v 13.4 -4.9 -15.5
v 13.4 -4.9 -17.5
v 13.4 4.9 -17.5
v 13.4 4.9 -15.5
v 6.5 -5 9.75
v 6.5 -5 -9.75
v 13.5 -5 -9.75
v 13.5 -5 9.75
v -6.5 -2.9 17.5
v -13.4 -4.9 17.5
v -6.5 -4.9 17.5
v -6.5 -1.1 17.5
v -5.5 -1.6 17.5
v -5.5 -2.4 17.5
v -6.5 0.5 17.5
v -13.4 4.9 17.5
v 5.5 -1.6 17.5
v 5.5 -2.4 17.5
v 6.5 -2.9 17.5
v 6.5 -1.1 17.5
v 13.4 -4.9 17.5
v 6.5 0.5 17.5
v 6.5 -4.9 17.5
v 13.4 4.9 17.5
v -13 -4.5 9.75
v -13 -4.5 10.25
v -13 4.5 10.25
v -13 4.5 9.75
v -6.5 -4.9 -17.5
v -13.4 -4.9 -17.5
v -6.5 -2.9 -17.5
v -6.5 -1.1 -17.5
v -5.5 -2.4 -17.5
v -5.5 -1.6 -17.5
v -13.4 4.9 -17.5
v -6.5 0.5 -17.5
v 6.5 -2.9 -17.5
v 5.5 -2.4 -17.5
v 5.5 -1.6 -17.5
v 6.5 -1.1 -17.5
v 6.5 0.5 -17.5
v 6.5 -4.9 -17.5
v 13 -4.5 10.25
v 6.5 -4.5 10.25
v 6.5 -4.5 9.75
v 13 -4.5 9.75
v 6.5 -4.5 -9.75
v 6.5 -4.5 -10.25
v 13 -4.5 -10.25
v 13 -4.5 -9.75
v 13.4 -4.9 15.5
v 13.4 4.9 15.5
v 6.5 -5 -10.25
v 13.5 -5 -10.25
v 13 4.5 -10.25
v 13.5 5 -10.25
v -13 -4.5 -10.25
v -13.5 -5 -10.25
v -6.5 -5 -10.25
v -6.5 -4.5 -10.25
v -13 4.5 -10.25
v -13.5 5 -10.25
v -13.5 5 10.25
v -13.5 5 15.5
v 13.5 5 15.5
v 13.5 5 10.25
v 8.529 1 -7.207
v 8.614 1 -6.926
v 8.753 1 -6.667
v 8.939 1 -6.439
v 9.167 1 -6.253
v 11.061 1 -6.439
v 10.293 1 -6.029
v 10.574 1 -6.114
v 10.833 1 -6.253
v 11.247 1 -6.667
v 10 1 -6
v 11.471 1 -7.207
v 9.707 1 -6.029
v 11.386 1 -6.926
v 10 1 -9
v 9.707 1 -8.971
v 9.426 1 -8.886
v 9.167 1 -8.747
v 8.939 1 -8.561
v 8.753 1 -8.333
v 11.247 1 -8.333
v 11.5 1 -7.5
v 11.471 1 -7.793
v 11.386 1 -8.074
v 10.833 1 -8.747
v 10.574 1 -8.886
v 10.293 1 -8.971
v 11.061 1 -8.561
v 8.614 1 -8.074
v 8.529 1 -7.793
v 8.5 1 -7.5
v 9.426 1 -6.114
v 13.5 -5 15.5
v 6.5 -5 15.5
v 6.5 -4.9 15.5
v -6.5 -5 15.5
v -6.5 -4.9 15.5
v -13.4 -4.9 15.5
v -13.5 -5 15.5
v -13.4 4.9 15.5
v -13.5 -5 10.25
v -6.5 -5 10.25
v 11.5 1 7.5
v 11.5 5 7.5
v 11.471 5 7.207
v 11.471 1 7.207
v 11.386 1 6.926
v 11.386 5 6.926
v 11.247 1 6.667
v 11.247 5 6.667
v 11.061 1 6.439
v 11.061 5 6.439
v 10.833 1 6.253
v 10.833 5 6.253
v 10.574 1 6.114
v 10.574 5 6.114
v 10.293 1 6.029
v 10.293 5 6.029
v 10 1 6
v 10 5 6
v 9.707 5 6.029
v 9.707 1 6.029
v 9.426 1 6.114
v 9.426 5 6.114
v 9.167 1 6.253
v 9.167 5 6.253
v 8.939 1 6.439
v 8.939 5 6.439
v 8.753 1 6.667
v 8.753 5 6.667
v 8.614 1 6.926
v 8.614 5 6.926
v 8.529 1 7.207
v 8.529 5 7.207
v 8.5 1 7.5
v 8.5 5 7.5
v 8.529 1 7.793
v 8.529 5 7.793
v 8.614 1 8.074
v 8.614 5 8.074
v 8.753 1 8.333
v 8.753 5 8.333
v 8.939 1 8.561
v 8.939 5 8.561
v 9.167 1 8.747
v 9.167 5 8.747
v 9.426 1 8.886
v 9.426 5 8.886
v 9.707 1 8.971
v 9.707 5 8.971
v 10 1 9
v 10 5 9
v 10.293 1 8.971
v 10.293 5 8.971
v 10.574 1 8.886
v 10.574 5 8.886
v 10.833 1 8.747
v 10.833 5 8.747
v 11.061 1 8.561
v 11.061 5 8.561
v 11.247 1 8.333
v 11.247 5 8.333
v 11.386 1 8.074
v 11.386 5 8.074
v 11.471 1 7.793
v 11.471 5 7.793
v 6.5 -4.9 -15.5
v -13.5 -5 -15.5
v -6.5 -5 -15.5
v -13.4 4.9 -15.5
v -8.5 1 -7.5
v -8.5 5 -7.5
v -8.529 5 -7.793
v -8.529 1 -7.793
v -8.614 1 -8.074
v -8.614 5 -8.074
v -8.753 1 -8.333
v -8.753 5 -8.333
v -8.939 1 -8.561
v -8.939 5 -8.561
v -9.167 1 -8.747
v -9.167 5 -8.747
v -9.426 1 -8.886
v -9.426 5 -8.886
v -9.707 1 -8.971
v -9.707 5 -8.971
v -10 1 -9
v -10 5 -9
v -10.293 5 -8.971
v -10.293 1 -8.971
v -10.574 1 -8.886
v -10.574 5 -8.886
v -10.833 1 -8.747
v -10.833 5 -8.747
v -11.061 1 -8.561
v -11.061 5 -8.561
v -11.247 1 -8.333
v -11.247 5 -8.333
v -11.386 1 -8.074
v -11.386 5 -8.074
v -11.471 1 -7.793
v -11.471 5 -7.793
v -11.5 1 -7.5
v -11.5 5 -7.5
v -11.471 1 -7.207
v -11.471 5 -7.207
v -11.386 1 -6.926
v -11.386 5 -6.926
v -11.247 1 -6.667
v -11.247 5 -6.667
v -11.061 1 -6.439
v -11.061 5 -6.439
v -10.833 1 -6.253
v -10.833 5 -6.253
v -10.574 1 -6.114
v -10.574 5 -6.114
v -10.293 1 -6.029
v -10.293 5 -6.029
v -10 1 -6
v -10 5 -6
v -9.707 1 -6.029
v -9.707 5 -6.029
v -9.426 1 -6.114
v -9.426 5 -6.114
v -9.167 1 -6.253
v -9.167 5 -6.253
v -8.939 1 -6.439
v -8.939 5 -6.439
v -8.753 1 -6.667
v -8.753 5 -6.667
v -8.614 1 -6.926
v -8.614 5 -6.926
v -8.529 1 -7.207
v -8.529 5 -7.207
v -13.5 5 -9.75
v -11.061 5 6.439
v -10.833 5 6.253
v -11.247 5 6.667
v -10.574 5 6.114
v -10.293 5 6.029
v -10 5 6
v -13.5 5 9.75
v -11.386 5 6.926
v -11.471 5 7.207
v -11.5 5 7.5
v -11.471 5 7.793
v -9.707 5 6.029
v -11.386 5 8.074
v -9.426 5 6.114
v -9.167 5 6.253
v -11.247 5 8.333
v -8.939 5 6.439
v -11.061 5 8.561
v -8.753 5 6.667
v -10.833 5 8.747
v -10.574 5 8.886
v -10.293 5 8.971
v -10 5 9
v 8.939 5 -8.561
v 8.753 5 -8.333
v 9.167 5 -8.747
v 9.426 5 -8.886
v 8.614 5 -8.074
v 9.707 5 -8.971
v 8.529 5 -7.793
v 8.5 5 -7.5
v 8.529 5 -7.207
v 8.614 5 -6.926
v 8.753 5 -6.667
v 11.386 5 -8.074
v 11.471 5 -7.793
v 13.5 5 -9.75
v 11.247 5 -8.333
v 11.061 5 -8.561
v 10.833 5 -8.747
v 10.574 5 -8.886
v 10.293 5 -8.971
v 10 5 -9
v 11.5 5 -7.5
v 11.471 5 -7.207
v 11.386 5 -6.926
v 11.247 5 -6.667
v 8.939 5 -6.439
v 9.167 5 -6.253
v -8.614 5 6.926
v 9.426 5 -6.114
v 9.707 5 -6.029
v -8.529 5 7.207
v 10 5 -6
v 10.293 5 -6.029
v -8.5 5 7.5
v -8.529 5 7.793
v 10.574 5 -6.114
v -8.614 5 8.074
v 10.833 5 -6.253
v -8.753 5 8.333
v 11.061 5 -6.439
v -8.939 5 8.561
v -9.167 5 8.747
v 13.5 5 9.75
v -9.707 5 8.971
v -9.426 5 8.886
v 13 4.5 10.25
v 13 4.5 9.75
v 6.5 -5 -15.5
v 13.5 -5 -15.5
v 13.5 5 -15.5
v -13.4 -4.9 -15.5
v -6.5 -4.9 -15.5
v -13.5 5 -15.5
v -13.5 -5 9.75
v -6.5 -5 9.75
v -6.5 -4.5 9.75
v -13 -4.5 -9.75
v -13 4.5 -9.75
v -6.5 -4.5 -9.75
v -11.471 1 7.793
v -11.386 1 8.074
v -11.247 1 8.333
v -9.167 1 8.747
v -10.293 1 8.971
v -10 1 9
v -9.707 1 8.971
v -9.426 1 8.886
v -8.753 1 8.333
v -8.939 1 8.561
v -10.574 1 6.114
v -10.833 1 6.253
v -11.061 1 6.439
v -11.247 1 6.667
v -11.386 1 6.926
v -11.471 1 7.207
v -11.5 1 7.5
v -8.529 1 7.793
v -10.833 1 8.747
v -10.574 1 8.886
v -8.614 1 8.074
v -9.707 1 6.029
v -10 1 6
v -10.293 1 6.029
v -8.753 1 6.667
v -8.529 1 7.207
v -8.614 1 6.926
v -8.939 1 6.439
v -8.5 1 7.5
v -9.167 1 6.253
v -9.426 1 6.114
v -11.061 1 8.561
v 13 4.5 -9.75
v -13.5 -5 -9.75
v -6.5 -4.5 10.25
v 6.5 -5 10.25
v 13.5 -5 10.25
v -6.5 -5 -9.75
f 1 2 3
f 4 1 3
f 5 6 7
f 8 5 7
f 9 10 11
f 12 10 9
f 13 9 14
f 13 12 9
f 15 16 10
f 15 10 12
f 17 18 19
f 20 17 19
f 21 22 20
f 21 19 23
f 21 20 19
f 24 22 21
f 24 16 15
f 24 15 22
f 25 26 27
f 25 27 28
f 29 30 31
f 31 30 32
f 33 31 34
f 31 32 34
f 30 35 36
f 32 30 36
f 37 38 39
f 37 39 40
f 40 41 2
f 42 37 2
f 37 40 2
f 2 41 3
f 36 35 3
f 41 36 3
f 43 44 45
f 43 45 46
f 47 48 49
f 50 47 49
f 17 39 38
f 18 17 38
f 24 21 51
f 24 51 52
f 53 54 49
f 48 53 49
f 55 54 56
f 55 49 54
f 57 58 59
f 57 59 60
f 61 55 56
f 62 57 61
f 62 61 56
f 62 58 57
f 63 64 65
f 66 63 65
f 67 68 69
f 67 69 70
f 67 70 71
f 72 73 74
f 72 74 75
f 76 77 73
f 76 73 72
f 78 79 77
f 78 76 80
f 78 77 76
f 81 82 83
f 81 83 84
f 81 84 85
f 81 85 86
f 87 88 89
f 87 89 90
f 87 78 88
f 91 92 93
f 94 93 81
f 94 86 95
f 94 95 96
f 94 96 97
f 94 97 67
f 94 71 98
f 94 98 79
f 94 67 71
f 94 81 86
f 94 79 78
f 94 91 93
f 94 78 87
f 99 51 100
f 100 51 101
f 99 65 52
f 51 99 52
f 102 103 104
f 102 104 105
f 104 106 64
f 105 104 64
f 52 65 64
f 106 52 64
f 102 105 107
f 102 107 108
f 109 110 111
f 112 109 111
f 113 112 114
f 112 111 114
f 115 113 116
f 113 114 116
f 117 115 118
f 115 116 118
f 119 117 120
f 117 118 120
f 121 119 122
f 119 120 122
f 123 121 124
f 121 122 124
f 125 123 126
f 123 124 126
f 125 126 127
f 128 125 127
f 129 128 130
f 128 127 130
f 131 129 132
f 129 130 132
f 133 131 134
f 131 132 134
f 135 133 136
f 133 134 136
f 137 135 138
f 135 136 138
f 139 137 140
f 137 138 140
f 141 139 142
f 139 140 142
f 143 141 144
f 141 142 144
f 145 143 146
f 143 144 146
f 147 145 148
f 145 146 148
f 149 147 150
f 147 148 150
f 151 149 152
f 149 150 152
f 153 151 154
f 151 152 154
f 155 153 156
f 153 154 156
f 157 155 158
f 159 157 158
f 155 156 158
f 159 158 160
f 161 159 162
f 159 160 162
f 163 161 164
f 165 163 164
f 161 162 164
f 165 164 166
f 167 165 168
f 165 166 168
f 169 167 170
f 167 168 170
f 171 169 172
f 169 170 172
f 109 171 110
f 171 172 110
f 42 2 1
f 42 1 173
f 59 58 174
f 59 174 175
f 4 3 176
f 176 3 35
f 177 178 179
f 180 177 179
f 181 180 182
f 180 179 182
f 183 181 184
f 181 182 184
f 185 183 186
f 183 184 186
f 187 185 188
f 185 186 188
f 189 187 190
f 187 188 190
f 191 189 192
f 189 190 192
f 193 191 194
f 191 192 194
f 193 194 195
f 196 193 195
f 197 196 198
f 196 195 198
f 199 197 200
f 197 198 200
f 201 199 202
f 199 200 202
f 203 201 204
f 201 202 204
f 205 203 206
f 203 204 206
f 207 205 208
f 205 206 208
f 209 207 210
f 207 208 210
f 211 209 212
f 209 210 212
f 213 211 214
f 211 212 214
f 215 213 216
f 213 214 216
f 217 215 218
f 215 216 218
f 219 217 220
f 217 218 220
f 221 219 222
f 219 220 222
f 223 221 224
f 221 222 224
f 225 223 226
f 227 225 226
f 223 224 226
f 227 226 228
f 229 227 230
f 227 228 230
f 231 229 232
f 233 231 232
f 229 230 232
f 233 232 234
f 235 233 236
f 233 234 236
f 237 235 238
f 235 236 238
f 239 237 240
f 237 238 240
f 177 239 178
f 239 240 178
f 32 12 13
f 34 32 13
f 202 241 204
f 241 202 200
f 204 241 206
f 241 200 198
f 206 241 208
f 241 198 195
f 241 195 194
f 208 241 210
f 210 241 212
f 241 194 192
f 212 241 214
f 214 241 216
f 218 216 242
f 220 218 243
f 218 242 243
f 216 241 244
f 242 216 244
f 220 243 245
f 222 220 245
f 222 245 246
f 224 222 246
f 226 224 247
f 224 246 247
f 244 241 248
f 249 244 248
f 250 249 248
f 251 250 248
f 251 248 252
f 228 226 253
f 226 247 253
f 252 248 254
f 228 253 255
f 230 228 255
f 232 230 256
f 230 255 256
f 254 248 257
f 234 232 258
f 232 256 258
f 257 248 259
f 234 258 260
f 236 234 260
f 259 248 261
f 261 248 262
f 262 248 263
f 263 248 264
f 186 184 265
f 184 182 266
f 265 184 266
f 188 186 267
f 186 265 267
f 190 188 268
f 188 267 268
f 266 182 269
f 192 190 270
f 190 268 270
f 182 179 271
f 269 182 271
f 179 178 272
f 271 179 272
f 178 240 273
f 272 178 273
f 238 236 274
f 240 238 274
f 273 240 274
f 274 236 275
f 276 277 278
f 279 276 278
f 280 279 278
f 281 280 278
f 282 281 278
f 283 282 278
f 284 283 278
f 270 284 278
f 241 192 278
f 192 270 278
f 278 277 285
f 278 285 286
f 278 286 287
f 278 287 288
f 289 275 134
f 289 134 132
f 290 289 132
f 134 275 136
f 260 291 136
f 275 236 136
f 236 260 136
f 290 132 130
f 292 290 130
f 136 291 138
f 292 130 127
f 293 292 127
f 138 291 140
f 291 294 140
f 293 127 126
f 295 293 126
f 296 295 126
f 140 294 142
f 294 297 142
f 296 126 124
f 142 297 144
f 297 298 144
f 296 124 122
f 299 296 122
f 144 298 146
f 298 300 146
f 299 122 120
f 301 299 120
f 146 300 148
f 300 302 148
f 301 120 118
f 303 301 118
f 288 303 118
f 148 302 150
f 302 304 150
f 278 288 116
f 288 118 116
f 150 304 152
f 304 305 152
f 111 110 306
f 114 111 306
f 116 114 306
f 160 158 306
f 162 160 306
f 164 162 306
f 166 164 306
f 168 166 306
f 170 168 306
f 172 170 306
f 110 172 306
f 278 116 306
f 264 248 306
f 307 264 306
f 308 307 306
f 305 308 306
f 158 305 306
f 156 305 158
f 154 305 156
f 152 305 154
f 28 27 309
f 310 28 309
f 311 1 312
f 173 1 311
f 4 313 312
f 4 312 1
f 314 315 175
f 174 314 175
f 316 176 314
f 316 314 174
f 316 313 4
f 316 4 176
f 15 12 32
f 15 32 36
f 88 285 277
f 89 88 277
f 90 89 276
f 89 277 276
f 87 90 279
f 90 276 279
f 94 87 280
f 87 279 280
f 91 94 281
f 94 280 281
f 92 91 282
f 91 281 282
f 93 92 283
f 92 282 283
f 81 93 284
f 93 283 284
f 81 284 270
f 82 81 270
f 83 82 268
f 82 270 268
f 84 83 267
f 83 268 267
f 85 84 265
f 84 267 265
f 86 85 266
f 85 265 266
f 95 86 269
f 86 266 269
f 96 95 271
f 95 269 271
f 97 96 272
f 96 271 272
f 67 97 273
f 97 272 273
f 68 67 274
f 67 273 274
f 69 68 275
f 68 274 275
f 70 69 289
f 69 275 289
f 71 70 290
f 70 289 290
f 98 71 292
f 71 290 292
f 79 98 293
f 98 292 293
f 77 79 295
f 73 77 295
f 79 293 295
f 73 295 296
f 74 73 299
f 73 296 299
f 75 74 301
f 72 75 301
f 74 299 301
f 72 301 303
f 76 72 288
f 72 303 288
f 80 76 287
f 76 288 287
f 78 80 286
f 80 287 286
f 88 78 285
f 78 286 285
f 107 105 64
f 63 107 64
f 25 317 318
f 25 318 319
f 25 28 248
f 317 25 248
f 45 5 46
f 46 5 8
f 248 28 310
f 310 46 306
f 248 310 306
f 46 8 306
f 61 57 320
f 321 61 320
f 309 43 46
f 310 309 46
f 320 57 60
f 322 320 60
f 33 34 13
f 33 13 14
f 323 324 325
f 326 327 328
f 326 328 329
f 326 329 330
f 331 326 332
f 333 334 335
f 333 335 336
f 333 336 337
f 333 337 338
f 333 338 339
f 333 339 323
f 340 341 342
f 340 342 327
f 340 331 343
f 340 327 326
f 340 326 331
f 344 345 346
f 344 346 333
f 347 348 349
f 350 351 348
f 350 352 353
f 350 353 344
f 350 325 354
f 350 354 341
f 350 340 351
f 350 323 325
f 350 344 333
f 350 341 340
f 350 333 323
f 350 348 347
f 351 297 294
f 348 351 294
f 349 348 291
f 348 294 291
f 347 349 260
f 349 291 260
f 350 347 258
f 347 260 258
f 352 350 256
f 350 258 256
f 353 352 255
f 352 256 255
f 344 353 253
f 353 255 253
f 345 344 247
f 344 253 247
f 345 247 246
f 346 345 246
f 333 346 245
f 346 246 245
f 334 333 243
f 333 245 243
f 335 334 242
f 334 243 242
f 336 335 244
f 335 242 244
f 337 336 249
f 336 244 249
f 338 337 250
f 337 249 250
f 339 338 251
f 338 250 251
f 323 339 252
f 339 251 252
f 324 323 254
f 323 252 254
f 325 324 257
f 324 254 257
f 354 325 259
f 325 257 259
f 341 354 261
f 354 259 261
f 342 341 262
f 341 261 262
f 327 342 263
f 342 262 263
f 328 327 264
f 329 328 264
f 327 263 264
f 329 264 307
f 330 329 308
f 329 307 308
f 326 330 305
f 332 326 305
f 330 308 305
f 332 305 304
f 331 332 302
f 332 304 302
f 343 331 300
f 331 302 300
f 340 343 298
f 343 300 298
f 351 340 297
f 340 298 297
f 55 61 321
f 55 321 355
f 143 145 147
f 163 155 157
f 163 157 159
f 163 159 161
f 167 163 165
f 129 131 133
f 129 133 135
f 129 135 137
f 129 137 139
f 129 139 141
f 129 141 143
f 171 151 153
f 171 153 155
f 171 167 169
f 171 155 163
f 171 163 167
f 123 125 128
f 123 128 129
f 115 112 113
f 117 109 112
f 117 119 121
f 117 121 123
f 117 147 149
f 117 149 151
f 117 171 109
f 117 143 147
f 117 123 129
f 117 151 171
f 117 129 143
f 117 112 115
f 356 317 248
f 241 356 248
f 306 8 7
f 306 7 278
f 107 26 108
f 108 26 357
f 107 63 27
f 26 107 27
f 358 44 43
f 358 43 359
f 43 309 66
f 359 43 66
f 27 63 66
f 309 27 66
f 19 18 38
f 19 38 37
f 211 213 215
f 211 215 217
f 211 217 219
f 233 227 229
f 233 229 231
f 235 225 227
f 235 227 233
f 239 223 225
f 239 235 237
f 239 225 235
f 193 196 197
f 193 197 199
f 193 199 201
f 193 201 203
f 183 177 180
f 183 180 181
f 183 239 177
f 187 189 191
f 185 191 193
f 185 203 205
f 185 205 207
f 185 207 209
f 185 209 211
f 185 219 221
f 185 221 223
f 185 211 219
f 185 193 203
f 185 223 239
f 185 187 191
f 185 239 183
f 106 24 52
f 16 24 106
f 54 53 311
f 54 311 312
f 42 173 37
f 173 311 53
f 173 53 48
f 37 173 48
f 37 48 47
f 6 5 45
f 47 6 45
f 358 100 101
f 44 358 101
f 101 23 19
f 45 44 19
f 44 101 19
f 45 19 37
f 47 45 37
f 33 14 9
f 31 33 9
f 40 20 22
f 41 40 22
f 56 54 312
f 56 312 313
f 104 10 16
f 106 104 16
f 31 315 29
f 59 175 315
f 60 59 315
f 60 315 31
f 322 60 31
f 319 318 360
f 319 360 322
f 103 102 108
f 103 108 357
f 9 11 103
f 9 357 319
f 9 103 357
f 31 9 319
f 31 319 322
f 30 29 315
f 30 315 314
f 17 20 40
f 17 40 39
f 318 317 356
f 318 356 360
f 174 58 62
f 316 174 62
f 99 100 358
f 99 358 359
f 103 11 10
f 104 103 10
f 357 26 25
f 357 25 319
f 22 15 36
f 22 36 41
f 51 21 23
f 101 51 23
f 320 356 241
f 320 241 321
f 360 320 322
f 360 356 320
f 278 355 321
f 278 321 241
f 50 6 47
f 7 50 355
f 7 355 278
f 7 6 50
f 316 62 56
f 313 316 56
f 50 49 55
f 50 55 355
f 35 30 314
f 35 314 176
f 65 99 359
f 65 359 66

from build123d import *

# Parameters (mm, degrees)
SKETCH_2_W               = 27
SKETCH_2_H               = 10
EXTRUDE_1_DEPTH          = 17.5
SKETCH_4_R               = 1.5
CUT_EXTRUDE_1_DEPTH      = 4
SKETCH_6_W               = 27
SKETCH_6_H               = 0.5
CUT_EXTRUDE_2_DEPTH      = 0.5
SKETCH_7_W               = 0.5
SKETCH_7_H               = 9.5
CUT_EXTRUDE_3_DEPTH      = 0.5
SKETCH_12_W              = 27
SKETCH_12_H              = 10
SKETCH_12_W_2            = 26.8
SKETCH_12_H_2            = 9.8
CUT_EXTRUDE_5_DEPTH      = 2
MIRROR_3_COPY_1_SKETCH_W = 0.5
MIRROR_3_COPY_1_SKETCH_H = 9.5
MIRROR_3_COPY_1_DEPTH    = 0.5
MIRROR_3_COPY_2_SKETCH_W = 27
MIRROR_3_COPY_2_SKETCH_H = 0.5
MIRROR_3_COPY_2_DEPTH    = 0.5
SKETCH_5_W               = 13
SKETCH_5_H               = 9.581228834
CUT_EXTRUDE_4_DEPTH      = 97
EXTRUDE_3_DEPTH          = 35


with BuildPart() as part:
    # 草图2 → 凸台-拉伸1 (new body, symmetric)
    with BuildSketch(Plane.XY):
        Rectangle(SKETCH_2_W, SKETCH_2_H)
    extrude(amount=EXTRUDE_1_DEPTH, both=True)

    # 草图4 → 切除-拉伸1 (cut)
    with BuildSketch(Plane(origin=(0, 5, 0), x_dir=(1, 0, 0), z_dir=(0, 1, 0))):
        with Locations((-10, 7.5)):
            Circle(SKETCH_4_R)
        with Locations((10, 7.5)):
            Circle(SKETCH_4_R)
        with Locations((-10, -7.5)):
            Circle(SKETCH_4_R)
        with Locations((10, -7.5)):
            Circle(SKETCH_4_R)
    extrude(amount=-CUT_EXTRUDE_1_DEPTH, mode=Mode.SUBTRACT)

    # 草图6 → 切除-拉伸2 (cut)
    with BuildSketch(Plane(origin=(0, 5, 0), x_dir=(1, 0, 0), z_dir=(0, 1, 0))):
        with Locations((0, 10)):
            Rectangle(SKETCH_6_W, SKETCH_6_H)
    cut_extrude_2 = extrude(amount=-CUT_EXTRUDE_2_DEPTH, mode=Mode.SUBTRACT)

    # 草图7 → 切除-拉伸3 (cut)
    with BuildSketch(Plane.ZY.offset(13.5)):
        with Locations((-10, -0.25)):
            Rectangle(SKETCH_7_W, SKETCH_7_H)
    cut_extrude_3 = extrude(amount=-CUT_EXTRUDE_3_DEPTH, mode=Mode.SUBTRACT)

    # 草图12 → 切除-拉伸5 (cut)
    with BuildSketch(Plane(origin=(0, 0, -17.5), x_dir=(-1, 0, 0), z_dir=(0, 0, -1))):
        Rectangle(SKETCH_12_W, SKETCH_12_H)
        Rectangle(SKETCH_12_W_2, SKETCH_12_H_2, mode=Mode.SUBTRACT)
    cut_extrude_5 = extrude(amount=-CUT_EXTRUDE_5_DEPTH, mode=Mode.SUBTRACT)

    # 镜向1: 切除-拉伸2 across plane
    add(cut_extrude_2.mirror(Plane.ZX), mode=Mode.SUBTRACT)

    # 镜向2: 切除-拉伸3 across plane
    add(cut_extrude_3.mirror(Plane(origin=(0, 0, 0), x_dir=(0, 0, 1), z_dir=(1, 0, 0))), mode=Mode.SUBTRACT)

    # 镜向3: 切除-拉伸5, 切除-拉伸2, 切除-拉伸3 across plane
    add(cut_extrude_5.mirror(Plane.XY), mode=Mode.SUBTRACT)
    add(cut_extrude_2.mirror(Plane.XY), mode=Mode.SUBTRACT)
    add(cut_extrude_3.mirror(Plane.XY), mode=Mode.SUBTRACT)

    # 镜向3 copy 1 sketch → 镜向3 copy 1 (cut)
    with BuildSketch(Plane(origin=(13.5, 0, 0), x_dir=(0, 0, -1), z_dir=(1, 0, 0))):
        with Locations((-10, -0.25)):
            Rectangle(MIRROR_3_COPY_1_SKETCH_W, MIRROR_3_COPY_1_SKETCH_H)
    extrude(amount=-MIRROR_3_COPY_1_DEPTH, mode=Mode.SUBTRACT)

    # 镜向3 copy 2 sketch → 镜向3 copy 2 (cut)
    with BuildSketch(Plane.XZ.offset(5)):
        with Locations((0, 10)):
            Rectangle(MIRROR_3_COPY_2_SKETCH_W, MIRROR_3_COPY_2_SKETCH_H)
    extrude(amount=-MIRROR_3_COPY_2_DEPTH, mode=Mode.SUBTRACT)

    # 草图5 → 切除-拉伸4 (cut)
    with BuildSketch(Plane.XY.offset(17.5)):
        with Locations((0, -4.290614417)):
            Rectangle(SKETCH_5_W, SKETCH_5_H)
    extrude(amount=-CUT_EXTRUDE_4_DEPTH, mode=Mode.SUBTRACT)

    # 草图9 → 凸台-拉伸3 (add)
    with BuildSketch(Plane.XY.offset(17.5)):
        Polygon((-6.5, -1.1), (-5.5, -1.6), (-5.5, -2.4), (-6.5, -2.9), align=None)
        Polygon((5.5, -1.6), (5.5, -2.4), (6.5, -2.9), (6.5, -1.1), align=None)
    extrude(amount=-EXTRUDE_3_DEPTH)


solid = part.part
